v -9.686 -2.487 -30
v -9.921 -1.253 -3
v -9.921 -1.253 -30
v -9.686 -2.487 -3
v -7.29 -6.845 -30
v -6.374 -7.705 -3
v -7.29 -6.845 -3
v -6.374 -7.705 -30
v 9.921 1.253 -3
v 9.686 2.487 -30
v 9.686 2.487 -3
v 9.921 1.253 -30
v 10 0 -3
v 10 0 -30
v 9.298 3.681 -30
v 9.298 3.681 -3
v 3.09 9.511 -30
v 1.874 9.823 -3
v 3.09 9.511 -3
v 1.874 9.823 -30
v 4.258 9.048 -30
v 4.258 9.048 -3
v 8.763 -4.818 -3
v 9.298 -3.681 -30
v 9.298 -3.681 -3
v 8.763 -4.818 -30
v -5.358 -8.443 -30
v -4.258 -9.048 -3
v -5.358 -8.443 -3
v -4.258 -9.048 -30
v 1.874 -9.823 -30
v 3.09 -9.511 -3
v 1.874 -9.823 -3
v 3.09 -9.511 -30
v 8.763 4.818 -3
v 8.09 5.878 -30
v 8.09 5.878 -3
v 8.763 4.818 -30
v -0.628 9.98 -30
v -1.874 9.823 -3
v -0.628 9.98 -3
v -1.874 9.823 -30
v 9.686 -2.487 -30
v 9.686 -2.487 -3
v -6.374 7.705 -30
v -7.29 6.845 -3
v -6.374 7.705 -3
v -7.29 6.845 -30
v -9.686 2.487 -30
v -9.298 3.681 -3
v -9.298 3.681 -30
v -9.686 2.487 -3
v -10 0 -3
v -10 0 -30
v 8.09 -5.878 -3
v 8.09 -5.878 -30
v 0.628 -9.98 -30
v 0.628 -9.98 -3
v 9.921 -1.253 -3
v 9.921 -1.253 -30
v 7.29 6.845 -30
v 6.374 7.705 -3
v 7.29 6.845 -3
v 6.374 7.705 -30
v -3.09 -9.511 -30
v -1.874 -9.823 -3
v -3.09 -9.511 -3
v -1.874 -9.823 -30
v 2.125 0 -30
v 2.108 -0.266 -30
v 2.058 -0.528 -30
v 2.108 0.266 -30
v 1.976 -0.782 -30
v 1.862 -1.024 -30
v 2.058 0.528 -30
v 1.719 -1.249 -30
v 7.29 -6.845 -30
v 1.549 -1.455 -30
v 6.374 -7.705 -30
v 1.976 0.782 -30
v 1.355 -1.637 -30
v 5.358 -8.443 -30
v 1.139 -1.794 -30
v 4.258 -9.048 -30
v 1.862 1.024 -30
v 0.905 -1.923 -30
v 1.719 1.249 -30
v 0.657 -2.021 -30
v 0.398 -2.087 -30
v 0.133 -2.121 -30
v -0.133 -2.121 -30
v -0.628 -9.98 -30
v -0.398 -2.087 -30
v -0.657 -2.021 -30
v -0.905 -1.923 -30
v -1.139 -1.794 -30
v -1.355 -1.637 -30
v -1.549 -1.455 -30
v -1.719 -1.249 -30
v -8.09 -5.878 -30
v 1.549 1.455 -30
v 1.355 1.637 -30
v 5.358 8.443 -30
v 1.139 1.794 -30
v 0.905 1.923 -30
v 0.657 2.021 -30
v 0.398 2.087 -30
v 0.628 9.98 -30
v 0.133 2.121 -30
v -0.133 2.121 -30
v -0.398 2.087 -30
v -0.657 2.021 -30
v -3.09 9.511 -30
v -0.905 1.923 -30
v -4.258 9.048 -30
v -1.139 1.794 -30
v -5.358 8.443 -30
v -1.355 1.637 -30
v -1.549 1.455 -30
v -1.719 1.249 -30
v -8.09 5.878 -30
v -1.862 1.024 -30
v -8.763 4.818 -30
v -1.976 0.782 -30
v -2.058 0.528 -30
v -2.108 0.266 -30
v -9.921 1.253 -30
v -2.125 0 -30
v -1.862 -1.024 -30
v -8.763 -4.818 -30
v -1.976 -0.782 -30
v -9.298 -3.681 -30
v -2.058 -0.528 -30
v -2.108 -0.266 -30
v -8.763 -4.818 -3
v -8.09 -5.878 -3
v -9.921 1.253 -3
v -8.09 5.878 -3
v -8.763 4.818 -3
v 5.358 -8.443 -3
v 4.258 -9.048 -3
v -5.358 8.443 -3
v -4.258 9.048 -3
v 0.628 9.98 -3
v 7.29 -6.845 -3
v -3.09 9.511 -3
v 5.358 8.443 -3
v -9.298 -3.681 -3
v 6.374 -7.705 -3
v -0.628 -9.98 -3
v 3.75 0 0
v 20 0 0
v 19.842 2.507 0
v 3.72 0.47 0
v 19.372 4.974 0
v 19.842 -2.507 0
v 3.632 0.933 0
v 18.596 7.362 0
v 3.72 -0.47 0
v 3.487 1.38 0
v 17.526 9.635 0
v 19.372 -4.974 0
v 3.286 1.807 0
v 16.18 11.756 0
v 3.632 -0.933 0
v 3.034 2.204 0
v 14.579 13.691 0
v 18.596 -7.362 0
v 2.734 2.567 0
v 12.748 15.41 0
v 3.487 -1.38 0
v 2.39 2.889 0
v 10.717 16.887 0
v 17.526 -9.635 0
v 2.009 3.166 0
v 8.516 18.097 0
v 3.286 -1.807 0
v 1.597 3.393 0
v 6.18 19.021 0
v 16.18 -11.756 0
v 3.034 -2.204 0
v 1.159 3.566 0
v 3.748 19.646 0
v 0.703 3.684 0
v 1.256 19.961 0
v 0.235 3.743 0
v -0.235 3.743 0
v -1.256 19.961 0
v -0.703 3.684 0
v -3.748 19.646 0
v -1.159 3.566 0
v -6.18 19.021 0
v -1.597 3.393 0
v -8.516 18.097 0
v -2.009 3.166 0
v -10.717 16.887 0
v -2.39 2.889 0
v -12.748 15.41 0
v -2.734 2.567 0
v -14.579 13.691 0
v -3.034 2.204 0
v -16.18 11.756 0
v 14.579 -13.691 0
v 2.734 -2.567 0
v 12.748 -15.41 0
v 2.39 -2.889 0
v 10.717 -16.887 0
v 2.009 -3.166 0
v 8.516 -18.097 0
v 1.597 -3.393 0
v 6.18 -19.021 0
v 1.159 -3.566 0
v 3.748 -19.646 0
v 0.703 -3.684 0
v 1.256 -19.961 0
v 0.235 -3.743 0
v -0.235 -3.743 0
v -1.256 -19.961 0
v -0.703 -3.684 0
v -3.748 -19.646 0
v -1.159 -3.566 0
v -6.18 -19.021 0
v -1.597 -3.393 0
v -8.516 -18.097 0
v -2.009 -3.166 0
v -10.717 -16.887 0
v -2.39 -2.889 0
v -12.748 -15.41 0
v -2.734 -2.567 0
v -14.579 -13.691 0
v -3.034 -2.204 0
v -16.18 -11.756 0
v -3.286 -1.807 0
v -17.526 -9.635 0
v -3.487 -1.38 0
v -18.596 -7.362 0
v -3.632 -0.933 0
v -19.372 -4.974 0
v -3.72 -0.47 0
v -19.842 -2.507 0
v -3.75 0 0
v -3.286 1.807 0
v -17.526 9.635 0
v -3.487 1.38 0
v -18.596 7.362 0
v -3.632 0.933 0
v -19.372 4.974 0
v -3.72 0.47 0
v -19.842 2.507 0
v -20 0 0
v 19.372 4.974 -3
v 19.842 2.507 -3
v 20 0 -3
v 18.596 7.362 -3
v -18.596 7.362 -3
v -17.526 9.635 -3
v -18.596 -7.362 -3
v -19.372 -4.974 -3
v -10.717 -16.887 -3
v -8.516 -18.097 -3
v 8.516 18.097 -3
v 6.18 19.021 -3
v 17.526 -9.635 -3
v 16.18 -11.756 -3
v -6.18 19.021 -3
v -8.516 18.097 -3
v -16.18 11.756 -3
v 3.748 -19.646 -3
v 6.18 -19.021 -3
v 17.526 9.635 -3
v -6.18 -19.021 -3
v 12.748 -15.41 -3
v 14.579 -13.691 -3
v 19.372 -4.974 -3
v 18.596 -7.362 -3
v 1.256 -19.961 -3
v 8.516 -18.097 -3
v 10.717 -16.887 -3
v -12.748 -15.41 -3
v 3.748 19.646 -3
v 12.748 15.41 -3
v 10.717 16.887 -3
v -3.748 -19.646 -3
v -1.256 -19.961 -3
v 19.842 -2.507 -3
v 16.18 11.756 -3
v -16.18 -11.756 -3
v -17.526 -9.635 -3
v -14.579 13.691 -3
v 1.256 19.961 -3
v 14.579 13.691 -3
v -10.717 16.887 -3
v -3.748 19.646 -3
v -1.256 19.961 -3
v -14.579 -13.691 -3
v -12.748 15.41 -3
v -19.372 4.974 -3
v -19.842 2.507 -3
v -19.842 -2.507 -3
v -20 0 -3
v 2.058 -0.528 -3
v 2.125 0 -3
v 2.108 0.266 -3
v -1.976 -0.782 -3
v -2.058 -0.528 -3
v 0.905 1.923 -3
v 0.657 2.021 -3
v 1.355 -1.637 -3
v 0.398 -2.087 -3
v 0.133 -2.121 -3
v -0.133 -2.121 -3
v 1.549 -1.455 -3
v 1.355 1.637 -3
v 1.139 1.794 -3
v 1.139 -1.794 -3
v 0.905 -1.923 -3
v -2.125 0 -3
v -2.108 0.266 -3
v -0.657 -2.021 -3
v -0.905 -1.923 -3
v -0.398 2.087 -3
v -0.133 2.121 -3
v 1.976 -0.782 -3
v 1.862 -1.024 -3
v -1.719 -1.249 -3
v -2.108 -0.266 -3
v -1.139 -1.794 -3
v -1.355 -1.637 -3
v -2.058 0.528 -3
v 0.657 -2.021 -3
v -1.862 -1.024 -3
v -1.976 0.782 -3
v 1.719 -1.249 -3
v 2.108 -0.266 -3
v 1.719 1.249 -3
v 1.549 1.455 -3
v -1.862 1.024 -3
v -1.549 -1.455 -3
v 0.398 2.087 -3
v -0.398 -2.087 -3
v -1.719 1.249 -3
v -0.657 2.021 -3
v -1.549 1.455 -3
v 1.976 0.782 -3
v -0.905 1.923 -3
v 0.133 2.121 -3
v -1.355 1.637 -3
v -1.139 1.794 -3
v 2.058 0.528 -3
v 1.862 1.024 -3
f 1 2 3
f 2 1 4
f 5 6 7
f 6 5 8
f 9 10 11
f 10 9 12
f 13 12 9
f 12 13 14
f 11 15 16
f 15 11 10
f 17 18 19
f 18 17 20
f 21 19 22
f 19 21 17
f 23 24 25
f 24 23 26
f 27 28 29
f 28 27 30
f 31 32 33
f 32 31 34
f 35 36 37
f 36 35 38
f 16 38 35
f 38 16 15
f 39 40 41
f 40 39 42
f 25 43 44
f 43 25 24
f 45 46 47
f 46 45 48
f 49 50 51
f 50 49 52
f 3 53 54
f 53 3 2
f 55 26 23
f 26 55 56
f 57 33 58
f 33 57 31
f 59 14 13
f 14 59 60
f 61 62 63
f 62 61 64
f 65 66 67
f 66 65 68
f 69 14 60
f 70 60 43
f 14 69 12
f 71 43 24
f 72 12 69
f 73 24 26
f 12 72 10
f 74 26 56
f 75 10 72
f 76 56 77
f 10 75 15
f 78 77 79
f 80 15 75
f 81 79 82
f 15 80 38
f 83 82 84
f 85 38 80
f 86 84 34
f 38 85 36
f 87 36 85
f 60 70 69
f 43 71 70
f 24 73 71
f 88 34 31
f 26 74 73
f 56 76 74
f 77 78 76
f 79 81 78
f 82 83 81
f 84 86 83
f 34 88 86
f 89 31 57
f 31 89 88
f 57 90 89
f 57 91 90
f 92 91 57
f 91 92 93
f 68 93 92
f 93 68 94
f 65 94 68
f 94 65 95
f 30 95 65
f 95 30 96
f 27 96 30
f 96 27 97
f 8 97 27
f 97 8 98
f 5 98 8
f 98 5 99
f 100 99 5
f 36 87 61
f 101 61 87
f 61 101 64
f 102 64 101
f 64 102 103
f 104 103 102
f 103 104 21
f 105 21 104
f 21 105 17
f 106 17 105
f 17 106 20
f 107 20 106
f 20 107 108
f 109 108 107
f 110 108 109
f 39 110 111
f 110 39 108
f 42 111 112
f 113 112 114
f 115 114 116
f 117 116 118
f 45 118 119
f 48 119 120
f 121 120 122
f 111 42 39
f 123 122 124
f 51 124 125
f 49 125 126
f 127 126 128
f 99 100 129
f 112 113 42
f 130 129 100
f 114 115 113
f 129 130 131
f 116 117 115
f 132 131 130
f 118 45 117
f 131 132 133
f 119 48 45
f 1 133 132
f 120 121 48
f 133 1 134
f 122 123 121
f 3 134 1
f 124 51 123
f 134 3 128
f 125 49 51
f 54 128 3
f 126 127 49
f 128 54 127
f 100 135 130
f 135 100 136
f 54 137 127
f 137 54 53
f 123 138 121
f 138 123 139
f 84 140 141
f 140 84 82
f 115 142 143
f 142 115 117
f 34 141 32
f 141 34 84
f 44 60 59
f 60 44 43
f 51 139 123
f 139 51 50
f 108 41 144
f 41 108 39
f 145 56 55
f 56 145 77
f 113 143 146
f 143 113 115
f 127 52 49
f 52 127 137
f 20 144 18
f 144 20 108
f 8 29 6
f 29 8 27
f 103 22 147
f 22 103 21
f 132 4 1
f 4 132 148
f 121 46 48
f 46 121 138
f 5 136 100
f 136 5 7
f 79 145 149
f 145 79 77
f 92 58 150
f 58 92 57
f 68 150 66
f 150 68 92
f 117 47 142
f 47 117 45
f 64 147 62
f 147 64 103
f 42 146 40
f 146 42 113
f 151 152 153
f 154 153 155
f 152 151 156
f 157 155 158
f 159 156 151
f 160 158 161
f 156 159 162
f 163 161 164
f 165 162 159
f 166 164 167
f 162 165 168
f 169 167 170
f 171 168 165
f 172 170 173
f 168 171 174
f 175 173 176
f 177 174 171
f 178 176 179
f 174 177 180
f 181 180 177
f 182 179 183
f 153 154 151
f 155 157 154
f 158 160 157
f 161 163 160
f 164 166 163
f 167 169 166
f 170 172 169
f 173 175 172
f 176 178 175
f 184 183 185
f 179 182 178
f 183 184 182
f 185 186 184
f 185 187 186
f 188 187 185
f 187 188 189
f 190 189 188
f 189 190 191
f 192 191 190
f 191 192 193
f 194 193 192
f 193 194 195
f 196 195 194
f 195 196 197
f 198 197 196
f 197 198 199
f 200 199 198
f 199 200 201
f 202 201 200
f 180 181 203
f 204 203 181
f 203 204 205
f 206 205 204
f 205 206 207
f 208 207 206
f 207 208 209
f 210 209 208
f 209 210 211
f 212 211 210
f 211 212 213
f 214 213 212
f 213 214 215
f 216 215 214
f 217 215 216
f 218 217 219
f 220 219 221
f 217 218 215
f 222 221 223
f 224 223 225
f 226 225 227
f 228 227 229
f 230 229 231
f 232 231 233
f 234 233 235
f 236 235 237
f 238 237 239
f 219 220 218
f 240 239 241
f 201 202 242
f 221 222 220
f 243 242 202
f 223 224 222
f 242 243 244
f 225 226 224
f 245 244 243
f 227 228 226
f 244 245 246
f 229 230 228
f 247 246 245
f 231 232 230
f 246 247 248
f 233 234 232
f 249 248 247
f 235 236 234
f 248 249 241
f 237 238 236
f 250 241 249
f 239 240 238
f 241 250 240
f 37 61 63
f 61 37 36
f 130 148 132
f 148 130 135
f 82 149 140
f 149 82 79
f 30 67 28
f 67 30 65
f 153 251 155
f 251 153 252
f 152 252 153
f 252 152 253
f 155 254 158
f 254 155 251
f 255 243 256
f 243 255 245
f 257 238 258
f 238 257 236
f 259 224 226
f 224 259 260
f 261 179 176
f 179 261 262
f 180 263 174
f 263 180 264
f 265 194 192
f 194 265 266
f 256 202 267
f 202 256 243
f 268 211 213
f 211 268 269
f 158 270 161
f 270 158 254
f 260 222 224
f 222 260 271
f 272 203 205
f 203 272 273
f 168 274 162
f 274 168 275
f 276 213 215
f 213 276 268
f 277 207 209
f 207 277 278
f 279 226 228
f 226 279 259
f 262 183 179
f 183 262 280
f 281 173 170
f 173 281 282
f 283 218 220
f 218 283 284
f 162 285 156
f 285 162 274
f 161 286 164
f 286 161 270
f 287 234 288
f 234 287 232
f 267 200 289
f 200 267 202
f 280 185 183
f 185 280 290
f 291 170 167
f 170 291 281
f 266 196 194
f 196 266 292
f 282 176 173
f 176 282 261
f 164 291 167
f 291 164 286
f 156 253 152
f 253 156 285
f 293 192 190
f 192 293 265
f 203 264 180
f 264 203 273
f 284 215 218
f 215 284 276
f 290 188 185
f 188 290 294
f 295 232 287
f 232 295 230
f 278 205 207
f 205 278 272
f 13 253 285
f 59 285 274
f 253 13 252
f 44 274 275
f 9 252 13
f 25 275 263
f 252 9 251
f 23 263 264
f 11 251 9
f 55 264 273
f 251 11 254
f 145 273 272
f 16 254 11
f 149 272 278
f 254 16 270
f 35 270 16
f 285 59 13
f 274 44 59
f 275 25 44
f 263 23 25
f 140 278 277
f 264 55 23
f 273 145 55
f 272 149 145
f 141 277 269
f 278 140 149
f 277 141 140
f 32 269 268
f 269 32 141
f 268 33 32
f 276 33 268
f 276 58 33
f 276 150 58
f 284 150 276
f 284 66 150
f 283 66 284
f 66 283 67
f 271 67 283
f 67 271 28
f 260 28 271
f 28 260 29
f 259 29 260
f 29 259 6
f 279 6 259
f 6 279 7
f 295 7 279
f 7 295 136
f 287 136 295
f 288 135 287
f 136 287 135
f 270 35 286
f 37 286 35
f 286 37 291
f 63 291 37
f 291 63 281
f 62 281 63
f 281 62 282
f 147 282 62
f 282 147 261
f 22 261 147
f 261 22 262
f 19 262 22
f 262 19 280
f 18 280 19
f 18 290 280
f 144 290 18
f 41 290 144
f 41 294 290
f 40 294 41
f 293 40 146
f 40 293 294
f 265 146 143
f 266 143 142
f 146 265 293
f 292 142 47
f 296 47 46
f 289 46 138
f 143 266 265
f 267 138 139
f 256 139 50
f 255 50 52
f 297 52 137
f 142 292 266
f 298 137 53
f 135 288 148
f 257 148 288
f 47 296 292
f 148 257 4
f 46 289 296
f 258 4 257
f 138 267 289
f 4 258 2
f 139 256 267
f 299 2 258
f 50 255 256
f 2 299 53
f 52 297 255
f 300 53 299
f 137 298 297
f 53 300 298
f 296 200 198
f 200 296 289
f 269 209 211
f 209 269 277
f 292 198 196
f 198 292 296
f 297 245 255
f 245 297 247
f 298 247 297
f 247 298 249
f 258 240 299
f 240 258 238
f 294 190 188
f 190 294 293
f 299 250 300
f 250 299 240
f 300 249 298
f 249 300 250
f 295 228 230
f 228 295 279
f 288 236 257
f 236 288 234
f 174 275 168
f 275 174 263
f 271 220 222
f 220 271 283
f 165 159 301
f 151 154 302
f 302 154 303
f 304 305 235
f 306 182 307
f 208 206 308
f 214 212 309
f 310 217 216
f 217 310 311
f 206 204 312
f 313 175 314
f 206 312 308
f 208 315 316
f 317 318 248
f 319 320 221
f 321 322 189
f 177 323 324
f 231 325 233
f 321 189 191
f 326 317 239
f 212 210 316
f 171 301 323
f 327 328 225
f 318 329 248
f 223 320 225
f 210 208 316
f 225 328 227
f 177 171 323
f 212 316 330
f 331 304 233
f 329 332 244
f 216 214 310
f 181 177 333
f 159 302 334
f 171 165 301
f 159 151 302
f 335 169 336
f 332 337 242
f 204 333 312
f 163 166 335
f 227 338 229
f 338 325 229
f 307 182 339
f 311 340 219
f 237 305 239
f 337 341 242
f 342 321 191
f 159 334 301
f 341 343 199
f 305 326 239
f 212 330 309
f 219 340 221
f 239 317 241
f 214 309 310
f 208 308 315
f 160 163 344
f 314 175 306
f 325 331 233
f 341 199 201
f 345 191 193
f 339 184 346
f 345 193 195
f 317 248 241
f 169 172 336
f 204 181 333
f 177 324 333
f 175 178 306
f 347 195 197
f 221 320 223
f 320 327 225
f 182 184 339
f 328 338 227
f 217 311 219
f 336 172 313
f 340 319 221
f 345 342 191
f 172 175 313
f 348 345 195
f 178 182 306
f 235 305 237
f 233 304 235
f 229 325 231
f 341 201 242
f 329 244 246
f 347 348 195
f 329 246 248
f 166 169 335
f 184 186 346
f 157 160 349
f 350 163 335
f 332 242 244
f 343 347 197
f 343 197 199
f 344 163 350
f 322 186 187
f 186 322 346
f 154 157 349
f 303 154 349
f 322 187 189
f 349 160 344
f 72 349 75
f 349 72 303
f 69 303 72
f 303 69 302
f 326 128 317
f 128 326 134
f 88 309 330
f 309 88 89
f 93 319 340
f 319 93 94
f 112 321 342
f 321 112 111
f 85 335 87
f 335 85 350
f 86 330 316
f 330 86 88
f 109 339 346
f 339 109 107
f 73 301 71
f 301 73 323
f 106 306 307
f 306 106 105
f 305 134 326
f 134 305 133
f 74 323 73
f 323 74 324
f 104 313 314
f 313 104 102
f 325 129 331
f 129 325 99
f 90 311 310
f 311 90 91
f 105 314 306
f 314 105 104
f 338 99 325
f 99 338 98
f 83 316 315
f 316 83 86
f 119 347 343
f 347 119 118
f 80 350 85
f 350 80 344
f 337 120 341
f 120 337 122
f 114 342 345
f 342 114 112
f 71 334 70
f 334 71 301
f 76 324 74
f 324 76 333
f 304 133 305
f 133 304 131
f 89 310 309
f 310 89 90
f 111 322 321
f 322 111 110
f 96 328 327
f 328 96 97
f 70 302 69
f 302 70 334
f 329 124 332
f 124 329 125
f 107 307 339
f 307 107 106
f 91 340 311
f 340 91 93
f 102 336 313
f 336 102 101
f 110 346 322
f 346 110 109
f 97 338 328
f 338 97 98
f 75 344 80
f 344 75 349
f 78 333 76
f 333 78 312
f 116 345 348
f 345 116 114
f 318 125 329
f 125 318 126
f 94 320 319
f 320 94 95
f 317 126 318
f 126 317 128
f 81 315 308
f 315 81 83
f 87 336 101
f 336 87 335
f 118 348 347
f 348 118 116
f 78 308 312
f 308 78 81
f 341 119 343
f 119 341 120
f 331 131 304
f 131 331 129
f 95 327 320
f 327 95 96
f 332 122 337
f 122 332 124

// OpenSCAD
$fn = 50;


difference() {
	union() {
		translate(v = [0, 0, -30.0000000000]) {
			cylinder(h = 30, r = 10.0000000000);
		}
		translate(v = [0, 0, -3.0000000000]) {
			cylinder(h = 3, r = 20.0000000000);
		}
	}
	union() {
		translate(v = [0, 0, 0]) {
			rotate(a = [0, 0, 0]) {
				difference() {
					union() {
						#translate(v = [0, 0, -30.0000000000]) {
							cylinder(h = 30, r = 2.0000000000);
						}
						#translate(v = [0, 0, -3]) {
							cylinder(h = 3, r1 = 2.1250000000, r2 = 3.7500000000);
						}
						#translate(v = [0, 0, -30.0000000000]) {
							cylinder(h = 30, r = 2.1250000000);
						}
						#translate(v = [0, 0, -30.0000000000]) {
							cylinder(h = 30, r = 2.0000000000);
						}
					}
					union();
				}
			}
		}
	}
}
